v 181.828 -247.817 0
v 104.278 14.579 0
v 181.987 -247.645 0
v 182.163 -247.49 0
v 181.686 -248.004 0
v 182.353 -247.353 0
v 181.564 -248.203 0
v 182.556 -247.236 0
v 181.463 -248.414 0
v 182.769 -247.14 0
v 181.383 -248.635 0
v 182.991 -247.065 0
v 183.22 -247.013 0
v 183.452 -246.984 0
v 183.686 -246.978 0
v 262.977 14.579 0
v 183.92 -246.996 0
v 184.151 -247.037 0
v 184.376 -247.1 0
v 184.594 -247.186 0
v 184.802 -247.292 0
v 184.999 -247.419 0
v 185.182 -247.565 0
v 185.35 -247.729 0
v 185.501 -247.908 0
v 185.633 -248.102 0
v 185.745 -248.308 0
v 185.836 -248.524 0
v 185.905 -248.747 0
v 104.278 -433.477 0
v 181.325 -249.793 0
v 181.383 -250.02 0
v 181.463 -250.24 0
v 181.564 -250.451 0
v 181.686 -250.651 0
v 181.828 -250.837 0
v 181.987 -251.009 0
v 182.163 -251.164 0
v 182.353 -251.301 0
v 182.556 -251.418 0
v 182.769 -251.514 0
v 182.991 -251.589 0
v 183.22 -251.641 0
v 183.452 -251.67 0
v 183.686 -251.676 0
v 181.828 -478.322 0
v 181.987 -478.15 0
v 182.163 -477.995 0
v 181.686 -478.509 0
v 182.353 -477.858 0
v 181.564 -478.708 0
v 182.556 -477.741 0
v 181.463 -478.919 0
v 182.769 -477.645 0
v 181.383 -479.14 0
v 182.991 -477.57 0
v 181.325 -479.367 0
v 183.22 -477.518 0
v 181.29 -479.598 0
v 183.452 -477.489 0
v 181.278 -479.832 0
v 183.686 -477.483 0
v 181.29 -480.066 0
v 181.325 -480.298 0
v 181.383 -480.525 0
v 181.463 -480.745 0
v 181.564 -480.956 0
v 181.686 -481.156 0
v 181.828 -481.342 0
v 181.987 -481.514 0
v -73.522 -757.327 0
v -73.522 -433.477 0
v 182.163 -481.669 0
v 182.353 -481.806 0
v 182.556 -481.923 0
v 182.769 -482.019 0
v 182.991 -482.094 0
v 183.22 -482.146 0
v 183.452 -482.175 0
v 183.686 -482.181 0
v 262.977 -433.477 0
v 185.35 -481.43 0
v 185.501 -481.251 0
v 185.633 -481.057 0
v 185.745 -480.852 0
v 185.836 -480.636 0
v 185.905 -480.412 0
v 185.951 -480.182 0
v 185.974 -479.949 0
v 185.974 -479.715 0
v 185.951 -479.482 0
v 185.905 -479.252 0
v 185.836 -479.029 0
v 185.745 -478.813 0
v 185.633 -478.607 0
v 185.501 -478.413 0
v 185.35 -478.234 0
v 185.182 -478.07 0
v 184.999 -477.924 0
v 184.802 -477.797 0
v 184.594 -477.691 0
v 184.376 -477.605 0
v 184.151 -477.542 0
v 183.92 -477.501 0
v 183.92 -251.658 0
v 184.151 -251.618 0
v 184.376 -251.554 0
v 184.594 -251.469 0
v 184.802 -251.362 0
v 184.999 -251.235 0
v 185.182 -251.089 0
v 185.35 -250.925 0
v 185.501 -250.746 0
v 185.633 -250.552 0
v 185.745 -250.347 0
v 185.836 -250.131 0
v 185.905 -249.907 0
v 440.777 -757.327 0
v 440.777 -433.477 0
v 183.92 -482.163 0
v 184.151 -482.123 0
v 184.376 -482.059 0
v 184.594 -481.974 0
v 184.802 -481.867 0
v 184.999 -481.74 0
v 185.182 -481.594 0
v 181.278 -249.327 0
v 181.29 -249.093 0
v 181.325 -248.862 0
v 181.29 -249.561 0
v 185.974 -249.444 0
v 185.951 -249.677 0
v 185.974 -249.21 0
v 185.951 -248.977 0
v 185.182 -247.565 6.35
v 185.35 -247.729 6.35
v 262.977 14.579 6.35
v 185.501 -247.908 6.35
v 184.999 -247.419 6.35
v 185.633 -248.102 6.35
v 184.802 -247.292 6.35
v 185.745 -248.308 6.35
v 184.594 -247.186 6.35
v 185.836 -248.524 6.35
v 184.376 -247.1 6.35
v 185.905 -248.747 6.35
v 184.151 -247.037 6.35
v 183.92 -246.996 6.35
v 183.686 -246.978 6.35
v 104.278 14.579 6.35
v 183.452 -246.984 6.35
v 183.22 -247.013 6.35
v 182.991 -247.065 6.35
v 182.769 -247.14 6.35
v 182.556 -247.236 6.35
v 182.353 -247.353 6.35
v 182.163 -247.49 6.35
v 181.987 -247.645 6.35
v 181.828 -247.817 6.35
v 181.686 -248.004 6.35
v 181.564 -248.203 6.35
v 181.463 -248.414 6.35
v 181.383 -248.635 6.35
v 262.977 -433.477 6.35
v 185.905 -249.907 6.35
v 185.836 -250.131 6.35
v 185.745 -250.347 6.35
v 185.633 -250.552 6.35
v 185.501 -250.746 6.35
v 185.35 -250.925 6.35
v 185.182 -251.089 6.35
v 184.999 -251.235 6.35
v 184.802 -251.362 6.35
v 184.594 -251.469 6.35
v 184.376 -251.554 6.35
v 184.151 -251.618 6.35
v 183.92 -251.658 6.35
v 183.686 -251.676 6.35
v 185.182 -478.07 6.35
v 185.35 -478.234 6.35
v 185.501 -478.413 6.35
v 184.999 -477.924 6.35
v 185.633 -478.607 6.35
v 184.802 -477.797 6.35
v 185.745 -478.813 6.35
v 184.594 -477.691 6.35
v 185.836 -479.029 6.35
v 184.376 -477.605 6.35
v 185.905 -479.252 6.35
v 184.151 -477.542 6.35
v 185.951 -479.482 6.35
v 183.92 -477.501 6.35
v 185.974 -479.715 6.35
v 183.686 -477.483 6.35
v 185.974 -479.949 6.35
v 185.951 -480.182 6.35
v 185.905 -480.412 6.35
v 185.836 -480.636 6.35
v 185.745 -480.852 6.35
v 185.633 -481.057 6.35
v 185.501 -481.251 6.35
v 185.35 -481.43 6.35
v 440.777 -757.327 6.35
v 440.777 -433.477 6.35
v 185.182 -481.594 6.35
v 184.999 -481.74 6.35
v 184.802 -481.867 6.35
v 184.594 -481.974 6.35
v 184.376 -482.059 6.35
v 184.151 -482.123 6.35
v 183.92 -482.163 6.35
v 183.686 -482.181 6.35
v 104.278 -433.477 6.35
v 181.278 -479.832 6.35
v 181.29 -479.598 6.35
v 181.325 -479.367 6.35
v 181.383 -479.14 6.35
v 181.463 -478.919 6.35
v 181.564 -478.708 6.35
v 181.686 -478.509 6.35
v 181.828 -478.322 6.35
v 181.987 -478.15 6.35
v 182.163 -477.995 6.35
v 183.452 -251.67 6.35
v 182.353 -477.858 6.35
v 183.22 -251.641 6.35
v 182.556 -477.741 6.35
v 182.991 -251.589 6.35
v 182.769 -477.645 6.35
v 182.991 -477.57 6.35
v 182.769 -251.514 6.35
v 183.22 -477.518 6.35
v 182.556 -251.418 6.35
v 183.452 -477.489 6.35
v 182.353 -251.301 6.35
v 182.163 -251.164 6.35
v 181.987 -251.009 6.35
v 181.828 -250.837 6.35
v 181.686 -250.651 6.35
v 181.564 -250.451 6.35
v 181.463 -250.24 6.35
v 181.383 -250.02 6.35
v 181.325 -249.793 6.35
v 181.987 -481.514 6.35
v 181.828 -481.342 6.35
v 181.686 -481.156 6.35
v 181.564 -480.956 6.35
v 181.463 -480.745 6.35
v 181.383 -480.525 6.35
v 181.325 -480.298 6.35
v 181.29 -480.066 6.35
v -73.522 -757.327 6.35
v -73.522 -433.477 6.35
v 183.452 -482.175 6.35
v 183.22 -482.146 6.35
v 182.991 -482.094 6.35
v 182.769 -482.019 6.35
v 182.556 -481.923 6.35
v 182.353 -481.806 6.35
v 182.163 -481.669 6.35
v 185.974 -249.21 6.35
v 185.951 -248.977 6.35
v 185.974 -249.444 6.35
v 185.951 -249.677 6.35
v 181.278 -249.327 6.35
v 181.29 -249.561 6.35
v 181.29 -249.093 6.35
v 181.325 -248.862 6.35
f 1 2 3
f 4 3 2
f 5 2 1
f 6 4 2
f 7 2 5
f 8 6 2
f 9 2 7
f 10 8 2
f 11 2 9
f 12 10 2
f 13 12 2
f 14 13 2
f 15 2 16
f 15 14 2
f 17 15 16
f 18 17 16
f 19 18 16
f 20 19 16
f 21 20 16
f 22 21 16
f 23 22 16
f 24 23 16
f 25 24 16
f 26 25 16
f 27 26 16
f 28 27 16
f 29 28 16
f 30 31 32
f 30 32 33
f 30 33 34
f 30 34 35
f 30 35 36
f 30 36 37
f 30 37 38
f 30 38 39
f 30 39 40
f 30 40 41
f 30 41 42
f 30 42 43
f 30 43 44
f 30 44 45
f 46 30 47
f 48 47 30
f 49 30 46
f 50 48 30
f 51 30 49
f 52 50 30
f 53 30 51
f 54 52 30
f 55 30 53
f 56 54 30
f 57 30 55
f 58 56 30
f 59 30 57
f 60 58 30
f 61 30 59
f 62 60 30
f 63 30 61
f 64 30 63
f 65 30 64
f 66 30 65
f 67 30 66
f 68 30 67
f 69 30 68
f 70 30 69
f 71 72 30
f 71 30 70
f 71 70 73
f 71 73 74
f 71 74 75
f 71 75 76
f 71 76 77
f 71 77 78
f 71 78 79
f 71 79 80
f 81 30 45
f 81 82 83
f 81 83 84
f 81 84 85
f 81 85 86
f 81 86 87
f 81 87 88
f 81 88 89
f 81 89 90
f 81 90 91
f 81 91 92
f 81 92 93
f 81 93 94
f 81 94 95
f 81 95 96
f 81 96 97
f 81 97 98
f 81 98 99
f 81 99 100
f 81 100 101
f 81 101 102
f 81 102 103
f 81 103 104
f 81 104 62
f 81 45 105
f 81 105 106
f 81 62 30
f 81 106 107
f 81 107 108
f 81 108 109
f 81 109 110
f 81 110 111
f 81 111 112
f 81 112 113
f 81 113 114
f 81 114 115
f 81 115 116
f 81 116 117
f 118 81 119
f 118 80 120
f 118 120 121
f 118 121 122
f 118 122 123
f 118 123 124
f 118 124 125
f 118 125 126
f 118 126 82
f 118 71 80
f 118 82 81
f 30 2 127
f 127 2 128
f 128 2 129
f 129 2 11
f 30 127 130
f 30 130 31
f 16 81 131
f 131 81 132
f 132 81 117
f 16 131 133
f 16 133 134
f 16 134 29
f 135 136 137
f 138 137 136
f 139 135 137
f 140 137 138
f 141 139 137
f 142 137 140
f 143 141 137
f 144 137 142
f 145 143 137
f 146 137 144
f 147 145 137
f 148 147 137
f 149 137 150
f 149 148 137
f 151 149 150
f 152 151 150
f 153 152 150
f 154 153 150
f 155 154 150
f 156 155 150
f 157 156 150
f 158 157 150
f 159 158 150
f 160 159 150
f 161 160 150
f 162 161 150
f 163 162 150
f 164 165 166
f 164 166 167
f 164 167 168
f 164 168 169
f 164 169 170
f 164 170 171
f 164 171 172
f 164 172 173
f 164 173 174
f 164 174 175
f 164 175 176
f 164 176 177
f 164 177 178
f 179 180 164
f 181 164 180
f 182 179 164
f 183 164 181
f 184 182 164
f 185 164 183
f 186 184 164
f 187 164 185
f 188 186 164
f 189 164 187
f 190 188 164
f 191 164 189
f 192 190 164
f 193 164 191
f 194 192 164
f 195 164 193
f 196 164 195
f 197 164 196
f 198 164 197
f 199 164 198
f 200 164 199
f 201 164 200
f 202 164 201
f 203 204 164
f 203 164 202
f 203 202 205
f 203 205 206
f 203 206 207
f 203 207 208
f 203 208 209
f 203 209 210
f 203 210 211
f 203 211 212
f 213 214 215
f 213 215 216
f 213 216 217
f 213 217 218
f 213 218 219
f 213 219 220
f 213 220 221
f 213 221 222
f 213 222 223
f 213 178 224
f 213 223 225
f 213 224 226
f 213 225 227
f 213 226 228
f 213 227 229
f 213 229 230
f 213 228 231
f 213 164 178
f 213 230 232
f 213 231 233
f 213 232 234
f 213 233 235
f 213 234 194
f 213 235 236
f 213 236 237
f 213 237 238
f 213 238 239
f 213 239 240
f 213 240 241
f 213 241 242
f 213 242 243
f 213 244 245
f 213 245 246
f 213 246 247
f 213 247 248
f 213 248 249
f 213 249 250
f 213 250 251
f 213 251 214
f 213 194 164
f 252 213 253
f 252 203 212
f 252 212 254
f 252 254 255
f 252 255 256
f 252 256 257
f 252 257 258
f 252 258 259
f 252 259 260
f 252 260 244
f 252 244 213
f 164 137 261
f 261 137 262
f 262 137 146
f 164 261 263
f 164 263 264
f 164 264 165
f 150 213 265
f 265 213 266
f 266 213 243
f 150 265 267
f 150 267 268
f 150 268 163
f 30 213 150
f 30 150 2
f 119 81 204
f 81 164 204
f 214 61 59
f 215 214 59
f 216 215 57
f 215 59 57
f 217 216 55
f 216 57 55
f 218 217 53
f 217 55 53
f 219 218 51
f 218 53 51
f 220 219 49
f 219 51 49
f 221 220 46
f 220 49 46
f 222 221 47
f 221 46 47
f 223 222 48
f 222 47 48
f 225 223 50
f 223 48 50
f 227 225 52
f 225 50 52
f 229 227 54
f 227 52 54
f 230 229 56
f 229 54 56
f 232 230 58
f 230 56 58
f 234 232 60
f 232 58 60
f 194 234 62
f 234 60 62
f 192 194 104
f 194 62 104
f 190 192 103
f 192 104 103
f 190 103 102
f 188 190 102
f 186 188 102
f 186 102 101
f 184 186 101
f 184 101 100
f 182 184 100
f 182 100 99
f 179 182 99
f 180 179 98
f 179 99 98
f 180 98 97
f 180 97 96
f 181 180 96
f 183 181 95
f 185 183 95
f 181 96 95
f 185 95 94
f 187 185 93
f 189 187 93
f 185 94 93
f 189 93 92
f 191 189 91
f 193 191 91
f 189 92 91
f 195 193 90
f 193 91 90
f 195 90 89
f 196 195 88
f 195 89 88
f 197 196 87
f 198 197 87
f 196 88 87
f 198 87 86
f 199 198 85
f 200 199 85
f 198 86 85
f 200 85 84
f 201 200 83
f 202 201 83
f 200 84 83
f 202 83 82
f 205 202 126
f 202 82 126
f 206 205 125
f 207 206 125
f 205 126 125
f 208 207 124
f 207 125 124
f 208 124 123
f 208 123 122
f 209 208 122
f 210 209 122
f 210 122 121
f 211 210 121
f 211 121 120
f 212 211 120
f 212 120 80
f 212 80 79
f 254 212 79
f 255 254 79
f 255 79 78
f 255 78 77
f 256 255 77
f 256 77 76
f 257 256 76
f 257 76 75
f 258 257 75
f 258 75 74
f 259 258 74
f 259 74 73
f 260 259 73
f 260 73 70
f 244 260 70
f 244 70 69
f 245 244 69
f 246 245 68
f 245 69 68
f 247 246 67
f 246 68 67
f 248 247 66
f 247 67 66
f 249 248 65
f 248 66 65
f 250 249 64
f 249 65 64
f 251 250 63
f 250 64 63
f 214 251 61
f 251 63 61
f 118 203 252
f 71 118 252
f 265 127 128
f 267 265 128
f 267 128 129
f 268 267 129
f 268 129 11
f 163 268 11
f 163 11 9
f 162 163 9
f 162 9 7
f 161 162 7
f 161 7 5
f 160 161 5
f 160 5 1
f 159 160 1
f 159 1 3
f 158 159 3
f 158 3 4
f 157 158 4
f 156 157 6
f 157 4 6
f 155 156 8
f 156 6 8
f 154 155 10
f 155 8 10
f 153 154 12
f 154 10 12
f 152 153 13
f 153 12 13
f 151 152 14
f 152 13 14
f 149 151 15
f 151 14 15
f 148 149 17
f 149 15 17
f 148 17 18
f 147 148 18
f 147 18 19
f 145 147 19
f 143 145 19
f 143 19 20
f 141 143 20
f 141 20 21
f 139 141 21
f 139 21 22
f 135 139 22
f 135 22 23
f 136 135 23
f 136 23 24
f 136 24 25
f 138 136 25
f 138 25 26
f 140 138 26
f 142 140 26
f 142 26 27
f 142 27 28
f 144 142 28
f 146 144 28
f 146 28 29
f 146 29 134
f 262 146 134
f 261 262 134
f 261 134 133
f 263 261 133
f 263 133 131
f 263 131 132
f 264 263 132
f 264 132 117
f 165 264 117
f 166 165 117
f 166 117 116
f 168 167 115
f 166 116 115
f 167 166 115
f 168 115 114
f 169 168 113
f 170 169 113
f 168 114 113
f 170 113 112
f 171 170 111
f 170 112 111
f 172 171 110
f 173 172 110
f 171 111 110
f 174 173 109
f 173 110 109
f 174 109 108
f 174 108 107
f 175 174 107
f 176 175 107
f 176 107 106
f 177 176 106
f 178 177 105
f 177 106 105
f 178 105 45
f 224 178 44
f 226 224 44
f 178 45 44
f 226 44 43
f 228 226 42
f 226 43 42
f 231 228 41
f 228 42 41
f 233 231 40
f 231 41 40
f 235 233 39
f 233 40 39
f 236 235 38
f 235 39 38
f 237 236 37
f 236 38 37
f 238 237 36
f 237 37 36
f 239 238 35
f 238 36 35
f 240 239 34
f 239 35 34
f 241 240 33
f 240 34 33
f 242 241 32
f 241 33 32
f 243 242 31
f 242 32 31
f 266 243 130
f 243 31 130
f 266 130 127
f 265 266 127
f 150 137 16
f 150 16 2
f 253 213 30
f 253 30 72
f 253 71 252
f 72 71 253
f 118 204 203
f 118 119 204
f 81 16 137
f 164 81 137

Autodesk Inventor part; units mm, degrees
ref_plane "YZ Plane" through (0, 0, 0) normal (1, 0, 0) x (0, 1, 0)
ref_plane "XZ Plane" through (0, 0, 0) normal (0, 1, 0) x (-1, 0, 0)
ref_plane "XY Plane" through (0, 0, 0) normal (0, 0, 1) x (1, 0, 0)
sketch "Sketch1" plane through (0, 0, 0) normal (0, 0, 1) x (1, 0, 0)
  line L0 (-73.5219, 27.2789) -> (440.7773, 27.2789)
  line L1 (440.7773, 27.2789) -> (440.7773, -861.7211)
  line L2 (440.7773, -861.7211) -> (-73.5219, -861.7211)
  line L3 (-73.5219, -861.7211) -> (-73.5219, 27.2789)
  point P0 (0, 0)
  dimension "d0" = 514.2992
  dimension "d1" = 889
extrude "Extrusion1" add sketch "Sketch1" along normal blind 6.35
sketch "Sketch3" plane through (0, 0, 6.35) normal (0, 0, 1) x (1, 0, 0)
  line L0 (-73.5219, 27.2789) -> (104.2781, 27.2789)
  line L1 (104.2781, 27.2789) -> (104.2781, -433.4771)
  line L2 (104.2781, -433.4771) -> (-73.5219, -433.4771)
  line L3 (-73.5219, -433.4771) -> (-73.5219, 27.2789)
  line L4 (440.7773, 27.2789) -> (262.9773, 27.2789)
  line L5 (262.9773, 27.2789) -> (262.9773, -433.4771)
  line L6 (262.9773, -433.4771) -> (440.7773, -433.4771)
  line L7 (440.7773, -433.4771) -> (440.7773, 27.2789)
  point P0 (0, 0)
  dimension "d4" = 177.8
  dimension "d5" = 460.756
  dimension "d6" = 177.8
  dimension "d7" = 460.756
extrude "Extrusion2" cut sketch "Sketch3" against normal blind 25.4
sketch "Sketch4" plane through (104.2781, 27.2789, 0) normal (0, 1, 0) x (1, 0, 0)
  line L0 (0, 0) -> (0, -6.35) projected
  line L1 (0, -6.35) -> (158.6992, -6.35) projected
  line L2 (158.6992, -6.35) -> (158.6992, 0) projected
  line L3 (0, 0) -> (158.6992, 0) projected
  point P0 (-104.2781, 0)
extrude "Extrusion3" add sketch "Sketch4" along normal blind 6.35
sketch "Sketch5" plane through (104.2781, 33.6289, 0) normal (0, 1, 0) x (1, 0, 0)
  line L0 (0, 0) -> (158.6992, 0) projected
  line L1 (0, -6.35) -> (0, 0) projected
  line L2 (158.6992, -6.35) -> (0, -6.35) projected
  line L3 (158.6992, 0) -> (158.6992, -6.35) projected
  point P0 (-104.2781, 0)
extrude "Extrusion4" cut sketch "Sketch5" against normal blind 6.35
sketch "Sketch6" plane through (104.2781, 27.2789, 0) normal (0, 1, 0) x (1, 0, 0)
  line L0 (0, -6.35) -> (0, 0) projected
  line L1 (158.6992, -6.35) -> (0, -6.35) projected
  line L2 (158.6992, 0) -> (158.6992, -6.35) projected
  line L3 (0, 0) -> (158.6992, 0) projected
  point P0 (-104.2781, 0)
extrude "Extrusion5" add sketch "Sketch6" along normal blind 6.35
sketch "Sketch7" plane through (0, 0, 0) normal (0, 0, -1) x (-1, 0, 0)
  line L0 (-440.7773, -861.7211) -> (73.5219, -861.7211) projected
  line L1 (-104.2781, 33.6289) -> (-262.9773, 33.6289) projected
  line L2 (-183.6277, -861.7211) -> (-183.6277, -362.9159)
  circle A0 centre (-183.6277, -362.9159) radius 2.3495
  point P0 (0, 0)
  dimension "d16" = 498.8052
  dimension "d17" = 4.699
extrude "Extrusion6" cut sketch "Sketch7" against normal blind 25.4
sketch "Sketch8" plane through (0, 0, 0) normal (0, 0, -1) x (-1, 0, 0)
  circle A0 centre (-183.6277, -362.9159) radius 2.3495 projected
  line L0 (-104.2781, 33.6289) -> (-262.9773, 33.6289) projected
  line L1 (-183.6277, -362.9159) -> (-183.6277, -593.4209)
  circle A1 centre (-183.6277, -593.4209) radius 2.3495
  point P0 (0, 0)
  dimension "d20" = 230.505
  dimension "d21" = 4.699
extrude "Extrusion7" cut sketch "Sketch8" against normal blind 25.4 contours A1
sketch "Sketch9" plane through (0, 0, 0) normal (0, 0, -1) x (-1, 0, 0)
  circle A0 centre (-183.6277, -593.4209) radius 2.3495 projected
  circle A1 centre (-183.6277, -362.9159) radius 2.3495 projected
  line L0 (-104.2781, 33.6289) -> (-262.9773, 33.6289) projected
  line L1 (-183.6277, 33.6289) -> (-183.6277, -347.3711)
  circle A2 centre (-183.6277, -347.3711) radius 2.3495
  line L2 (-183.6277, -347.3711) -> (-183.6277, -362.9159)
  line L3 (-183.6277, -593.4209) -> (-183.6277, -577.8761)
  circle A3 centre (-183.6277, -577.8761) radius 2.3495
  point P0 (0, 0)
  dimension "d24" = 381
  dimension "d25" = 15.5448
extrude "Extrusion8" cut sketch "Sketch9" against normal blind 25.4 contours A3 | A2 L1 L2 | L2 L1 A2
sketch "Sketch10" plane through (0, 0, 0) normal (0, 0, -1) x (-1, 0, 0)
  circle A0 centre (-183.6277, -593.4209) radius 2.3495 projected
  circle A1 centre (-183.6277, -362.9159) radius 2.3495 projected
  point P0 (0, 0)
extrude "Extrusion9" add sketch "Sketch10" against normal blind 6.35
sketch "Sketch11" plane through (0, 0, 6.35) normal (0, 0, 1) x (1, 0, 0)
  line L0 (104.2781, -433.4771) -> (-73.5219, -433.4771) projected
  line L1 (-73.5219, -861.7211) -> (-73.5219, -433.4771) projected
  line L2 (440.7773, -861.7211) -> (-73.5219, -861.7211) projected
  line L3 (440.7773, -433.4771) -> (440.7773, -861.7211) projected
  line L4 (262.9773, 33.6289) -> (104.2781, 33.6289) projected
  line L5 (49.7648, -433.4771) -> (49.7648, -750.9771)
  line L6 (49.7648, -750.9771) -> (49.7648, -757.3271)
  line L7 (49.7648, -757.3271) -> (-73.5219, -757.3271)
  line L8 (49.7648, -757.3271) -> (440.7773, -757.3271)
  point P0 (0, 0)
  dimension "d30" = 317.5
  dimension "d31" = 6.35
extrude "Extrusion10" cut sketch "Sketch11" against normal blind 6.35 contours L7 L8 L3 L2 L1
sketch "Sketch12" plane through (0, 0, 0) normal (0, 0, -1) x (-1, 0, 0)
  line L0 (-440.7773, -433.4771) -> (-440.7773, -757.3271) projected
  circle A0 centre (-183.6277, -577.8761) radius 2.3495 projected
  circle A1 centre (-183.6277, -347.3711) radius 2.3495 projected
  line L1 (-183.6277, -347.3711) -> (-183.6277, -249.3271)
  line L2 (-183.6277, -577.8761) -> (-183.6277, -479.8321)
  circle A2 centre (-183.6277, -479.8321) radius 2.3495
  circle A3 centre (-183.6277, -249.3271) radius 2.3495
  point P0 (0, 0)
  dimension "d34" = 98.044
  dimension "d35" = 98.044
extrude "Extrusion11" cut sketch "Sketch12" against normal blind 6.35 contours A2 | A3
sketch "Sketch13" plane through (0, 0, 0) normal (0, 0, -1) x (-1, 0, 0)
  circle A0 centre (-183.6277, -577.8761) radius 2.3495 projected
  circle A1 centre (-183.6277, -347.3711) radius 2.3495 projected
  point P0 (0, 0)
extrude "Extrusion12" add sketch "Sketch13" against normal blind 6.35
sketch "Sketch14" plane through (0, 0, 6.35) normal (0, 0, 1) x (1, 0, 0)
  line L0 (262.9773, -433.4771) -> (262.9773, 33.6289) projected
  line L1 (104.2781, 33.6289) -> (262.9773, 33.6289)
  line L2 (262.9773, 33.6289) -> (262.9773, 14.5789)
  line L3 (262.9773, 14.5789) -> (104.2781, 14.5789)
  line L4 (104.2781, 14.5789) -> (104.2781, 33.6289)
  point P0 (0, 0)
  dimension "d40" = 19.05
extrude "Extrusion13" cut sketch "Sketch14" against normal blind 25.4
properties part number "front"
